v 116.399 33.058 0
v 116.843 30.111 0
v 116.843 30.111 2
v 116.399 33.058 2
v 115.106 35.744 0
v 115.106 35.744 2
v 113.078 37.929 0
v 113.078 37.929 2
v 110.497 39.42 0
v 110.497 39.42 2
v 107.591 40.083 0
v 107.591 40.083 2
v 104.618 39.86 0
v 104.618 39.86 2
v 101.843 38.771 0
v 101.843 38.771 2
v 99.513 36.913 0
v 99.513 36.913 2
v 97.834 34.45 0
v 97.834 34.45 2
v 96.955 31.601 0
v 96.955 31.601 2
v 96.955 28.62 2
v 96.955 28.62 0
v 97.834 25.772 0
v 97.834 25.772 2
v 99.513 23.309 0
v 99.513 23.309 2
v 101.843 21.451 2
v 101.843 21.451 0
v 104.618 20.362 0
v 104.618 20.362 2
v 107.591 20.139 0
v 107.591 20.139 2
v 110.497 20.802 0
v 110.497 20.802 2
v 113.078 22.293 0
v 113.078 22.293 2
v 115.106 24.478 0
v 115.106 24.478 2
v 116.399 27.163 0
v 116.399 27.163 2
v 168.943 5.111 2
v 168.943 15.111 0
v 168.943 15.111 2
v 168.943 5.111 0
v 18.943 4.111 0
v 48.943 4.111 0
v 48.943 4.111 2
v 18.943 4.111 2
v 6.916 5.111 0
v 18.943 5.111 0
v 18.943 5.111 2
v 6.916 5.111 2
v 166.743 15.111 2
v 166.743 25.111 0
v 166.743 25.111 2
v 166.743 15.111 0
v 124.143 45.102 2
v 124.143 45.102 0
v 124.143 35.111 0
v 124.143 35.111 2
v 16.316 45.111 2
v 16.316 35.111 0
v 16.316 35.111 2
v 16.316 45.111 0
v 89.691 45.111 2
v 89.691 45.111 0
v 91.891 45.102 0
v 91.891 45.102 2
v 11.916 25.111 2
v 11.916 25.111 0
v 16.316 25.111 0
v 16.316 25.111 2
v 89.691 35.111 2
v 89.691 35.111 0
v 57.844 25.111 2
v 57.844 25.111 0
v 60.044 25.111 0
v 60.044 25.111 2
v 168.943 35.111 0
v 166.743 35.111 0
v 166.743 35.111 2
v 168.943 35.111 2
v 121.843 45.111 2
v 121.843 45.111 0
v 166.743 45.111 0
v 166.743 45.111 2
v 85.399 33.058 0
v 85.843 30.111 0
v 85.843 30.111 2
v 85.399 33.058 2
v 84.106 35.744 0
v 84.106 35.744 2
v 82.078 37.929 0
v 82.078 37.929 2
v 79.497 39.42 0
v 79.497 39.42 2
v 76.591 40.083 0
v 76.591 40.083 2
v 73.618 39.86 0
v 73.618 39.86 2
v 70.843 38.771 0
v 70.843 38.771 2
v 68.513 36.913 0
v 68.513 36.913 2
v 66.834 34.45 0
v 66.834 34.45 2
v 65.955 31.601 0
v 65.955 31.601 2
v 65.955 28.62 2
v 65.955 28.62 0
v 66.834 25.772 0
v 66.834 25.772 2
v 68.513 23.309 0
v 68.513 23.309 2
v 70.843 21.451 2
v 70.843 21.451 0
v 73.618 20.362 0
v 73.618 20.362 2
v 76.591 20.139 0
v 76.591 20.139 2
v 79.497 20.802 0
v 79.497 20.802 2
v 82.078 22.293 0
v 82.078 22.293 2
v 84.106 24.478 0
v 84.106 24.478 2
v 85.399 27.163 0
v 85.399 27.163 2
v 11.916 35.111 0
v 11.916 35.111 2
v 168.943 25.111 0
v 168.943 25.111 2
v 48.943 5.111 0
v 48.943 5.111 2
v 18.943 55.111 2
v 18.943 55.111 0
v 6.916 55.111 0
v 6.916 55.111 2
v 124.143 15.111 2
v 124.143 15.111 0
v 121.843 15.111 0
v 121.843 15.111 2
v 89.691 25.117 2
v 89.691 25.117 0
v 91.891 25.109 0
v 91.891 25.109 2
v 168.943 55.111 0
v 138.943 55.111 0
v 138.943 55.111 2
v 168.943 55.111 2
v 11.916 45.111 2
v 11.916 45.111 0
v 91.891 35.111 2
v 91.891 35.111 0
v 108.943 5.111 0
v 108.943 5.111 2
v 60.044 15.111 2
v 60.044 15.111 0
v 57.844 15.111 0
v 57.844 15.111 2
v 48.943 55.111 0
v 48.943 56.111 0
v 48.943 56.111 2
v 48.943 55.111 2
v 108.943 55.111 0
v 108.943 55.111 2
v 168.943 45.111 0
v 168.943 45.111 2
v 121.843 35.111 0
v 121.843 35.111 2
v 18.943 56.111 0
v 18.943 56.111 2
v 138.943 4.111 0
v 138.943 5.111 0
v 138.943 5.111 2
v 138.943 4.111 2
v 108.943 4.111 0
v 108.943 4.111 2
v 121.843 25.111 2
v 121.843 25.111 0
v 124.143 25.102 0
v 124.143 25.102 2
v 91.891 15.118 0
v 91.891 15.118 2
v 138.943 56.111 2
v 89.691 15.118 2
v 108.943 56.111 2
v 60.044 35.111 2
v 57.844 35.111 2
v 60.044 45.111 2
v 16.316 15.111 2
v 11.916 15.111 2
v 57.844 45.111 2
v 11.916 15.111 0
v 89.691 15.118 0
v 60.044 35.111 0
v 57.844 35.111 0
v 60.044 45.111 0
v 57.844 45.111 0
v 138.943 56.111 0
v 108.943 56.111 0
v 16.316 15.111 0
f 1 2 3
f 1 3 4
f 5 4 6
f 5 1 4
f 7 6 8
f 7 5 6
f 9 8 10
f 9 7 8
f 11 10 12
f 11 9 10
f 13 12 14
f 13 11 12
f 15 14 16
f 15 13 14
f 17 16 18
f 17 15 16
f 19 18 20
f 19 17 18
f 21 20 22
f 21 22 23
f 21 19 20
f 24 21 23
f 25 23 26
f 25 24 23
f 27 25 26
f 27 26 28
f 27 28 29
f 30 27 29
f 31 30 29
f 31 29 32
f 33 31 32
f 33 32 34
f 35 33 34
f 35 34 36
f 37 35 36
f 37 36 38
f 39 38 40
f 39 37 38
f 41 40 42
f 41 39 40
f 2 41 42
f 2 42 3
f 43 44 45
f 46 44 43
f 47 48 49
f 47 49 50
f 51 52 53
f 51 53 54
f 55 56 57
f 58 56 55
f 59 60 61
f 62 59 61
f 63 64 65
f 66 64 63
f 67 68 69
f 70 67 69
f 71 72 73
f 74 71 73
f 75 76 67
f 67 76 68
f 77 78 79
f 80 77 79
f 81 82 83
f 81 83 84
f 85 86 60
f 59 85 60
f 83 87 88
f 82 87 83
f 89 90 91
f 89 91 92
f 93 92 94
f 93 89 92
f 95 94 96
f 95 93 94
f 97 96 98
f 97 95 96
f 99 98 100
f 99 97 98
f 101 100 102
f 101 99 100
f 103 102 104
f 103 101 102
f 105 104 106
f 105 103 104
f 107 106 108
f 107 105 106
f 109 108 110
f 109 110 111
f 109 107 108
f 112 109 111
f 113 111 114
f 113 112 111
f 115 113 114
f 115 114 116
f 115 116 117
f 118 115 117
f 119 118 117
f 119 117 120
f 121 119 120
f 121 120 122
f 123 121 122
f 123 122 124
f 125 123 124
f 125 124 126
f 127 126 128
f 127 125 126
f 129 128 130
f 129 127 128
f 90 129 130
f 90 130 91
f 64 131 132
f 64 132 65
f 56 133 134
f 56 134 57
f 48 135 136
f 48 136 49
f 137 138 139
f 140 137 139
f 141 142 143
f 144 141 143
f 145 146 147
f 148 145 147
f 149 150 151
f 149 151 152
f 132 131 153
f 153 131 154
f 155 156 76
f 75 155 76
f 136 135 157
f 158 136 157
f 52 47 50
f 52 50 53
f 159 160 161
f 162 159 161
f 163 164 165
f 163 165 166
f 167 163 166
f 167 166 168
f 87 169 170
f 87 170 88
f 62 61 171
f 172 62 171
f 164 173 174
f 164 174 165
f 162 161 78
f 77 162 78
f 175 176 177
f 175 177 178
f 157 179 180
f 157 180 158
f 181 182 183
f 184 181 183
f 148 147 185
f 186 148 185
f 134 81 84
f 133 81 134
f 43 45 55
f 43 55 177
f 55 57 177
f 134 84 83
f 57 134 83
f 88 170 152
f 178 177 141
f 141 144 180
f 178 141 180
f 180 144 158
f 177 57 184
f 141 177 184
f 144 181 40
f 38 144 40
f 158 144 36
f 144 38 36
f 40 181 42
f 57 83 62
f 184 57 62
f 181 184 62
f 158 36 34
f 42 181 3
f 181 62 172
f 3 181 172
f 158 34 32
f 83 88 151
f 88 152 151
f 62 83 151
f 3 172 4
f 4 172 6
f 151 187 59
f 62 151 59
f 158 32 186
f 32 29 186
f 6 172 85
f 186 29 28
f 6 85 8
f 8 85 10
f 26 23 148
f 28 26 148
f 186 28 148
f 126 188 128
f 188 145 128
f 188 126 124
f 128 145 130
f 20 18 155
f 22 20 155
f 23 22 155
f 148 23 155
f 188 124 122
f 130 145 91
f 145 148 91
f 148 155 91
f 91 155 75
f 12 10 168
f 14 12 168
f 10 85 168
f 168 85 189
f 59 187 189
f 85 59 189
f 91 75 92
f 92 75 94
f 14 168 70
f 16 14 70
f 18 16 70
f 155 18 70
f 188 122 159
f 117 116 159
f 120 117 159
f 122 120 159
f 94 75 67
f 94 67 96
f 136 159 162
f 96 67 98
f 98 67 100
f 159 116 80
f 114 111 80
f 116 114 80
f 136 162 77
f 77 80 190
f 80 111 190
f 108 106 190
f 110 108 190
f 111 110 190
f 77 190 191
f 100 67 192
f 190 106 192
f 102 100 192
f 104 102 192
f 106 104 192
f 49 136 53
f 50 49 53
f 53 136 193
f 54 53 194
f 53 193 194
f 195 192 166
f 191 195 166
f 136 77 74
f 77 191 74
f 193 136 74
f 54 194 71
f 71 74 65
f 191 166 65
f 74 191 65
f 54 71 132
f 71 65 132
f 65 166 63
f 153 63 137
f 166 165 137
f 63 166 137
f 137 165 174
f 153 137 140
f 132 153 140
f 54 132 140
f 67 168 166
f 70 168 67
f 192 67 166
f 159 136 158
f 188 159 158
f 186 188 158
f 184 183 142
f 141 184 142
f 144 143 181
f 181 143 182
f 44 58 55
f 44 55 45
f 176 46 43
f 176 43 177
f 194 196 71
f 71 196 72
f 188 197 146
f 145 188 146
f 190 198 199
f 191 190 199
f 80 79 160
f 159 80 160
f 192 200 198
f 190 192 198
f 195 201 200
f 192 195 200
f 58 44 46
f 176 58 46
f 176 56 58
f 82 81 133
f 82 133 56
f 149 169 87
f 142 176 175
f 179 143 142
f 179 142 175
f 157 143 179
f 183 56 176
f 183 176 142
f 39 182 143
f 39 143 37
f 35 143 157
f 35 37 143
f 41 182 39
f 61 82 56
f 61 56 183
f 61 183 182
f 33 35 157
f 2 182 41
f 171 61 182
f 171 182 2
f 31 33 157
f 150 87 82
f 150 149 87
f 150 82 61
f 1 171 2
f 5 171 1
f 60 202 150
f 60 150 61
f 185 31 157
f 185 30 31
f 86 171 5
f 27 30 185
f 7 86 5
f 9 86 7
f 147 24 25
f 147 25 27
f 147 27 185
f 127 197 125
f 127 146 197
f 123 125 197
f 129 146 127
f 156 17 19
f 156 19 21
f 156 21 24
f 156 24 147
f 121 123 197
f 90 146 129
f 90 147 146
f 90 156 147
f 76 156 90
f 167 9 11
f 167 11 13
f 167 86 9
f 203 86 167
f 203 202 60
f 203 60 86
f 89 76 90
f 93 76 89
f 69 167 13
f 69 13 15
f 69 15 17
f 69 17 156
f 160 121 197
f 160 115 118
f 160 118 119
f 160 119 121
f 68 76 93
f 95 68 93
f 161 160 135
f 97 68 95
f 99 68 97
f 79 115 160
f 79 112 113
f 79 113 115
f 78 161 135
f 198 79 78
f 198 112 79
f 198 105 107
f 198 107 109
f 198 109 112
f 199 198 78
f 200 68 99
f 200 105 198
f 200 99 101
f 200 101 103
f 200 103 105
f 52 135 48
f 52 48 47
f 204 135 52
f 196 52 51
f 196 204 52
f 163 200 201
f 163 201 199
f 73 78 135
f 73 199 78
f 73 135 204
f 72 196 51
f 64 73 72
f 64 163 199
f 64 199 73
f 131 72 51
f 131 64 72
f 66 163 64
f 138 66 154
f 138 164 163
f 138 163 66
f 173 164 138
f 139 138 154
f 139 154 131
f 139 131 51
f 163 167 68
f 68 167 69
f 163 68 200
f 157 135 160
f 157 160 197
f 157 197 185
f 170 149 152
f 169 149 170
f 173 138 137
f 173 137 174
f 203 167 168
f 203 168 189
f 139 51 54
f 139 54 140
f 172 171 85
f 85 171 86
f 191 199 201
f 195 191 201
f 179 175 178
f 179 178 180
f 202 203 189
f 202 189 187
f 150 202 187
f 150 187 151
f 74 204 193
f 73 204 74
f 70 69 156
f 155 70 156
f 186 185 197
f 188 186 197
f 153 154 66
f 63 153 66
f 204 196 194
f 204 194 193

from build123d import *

# Parameters (mm, degrees)
MODEL_R         = 10
MODEL_W         = 4.4
MODEL_H         = 10
EXTRUDE_1_DEPTH = 2


with BuildPart() as part:
    # Model → 凸台-拉伸1 (new body)
    with BuildSketch(Plane.XY):
        Polygon((13.943428414, 55.11082042), (18.943428414, 55.11082042), (18.943428414, 56.11082042), (48.943428414, 56.11082042), (48.943428414, 55.11082042), (108.943428414, 55.11082042), (108.943428414, 56.11082042), (138.943428414, 56.11082042), (138.943428414, 55.11082042), (168.943428414, 55.11082042), (168.943428414, 45.11082042), (166.743428414, 45.11082042), (166.743428414, 35.11082042), (168.943428414, 35.11082042), (168.943428414, 25.11082042), (166.743428414, 25.11082042), (166.743428414, 15.11082042), (168.943428414, 15.11082042), (168.943428414, 5.11082042), (138.943428414, 5.11082042), (138.943428414, 4.11082042), (108.943428414, 4.11082042), (108.943428414, 5.11082042), (61.943428414, 5.11082042), (55.943428414, 5.11082042), (48.943428414, 5.11082042), (48.943428414, 4.11082042), (18.943428414, 4.11082042), (18.943428414, 5.11082042), (6.91562917, 5.11082042), (6.91562917, 55.11082042), align=None)
        with Locations((75.843428414, 30.11082042)):
            Circle(MODEL_R, mode=Mode.SUBTRACT)
        with Locations((106.843428414, 30.11082042)):
            Circle(MODEL_R, mode=Mode.SUBTRACT)
        Polygon((89.690784519, 25.117395738), (91.890784519, 25.108786537), (91.89091955, 15.117786537), (89.690784519, 15.117786537), align=None, mode=Mode.SUBTRACT)
        Polygon((89.690784519, 45.110819609), (91.890784519, 45.102210408), (91.890784519, 35.110819609), (89.690784519, 35.110819609), align=None, mode=Mode.SUBTRACT)
        Polygon((121.843427205, 45.110819609), (124.143292174, 45.101819609), (124.143427205, 35.110819609), (121.843427205, 35.110819609), align=None, mode=Mode.SUBTRACT)
        Polygon((121.843427205, 25.110819609), (124.143292174, 25.101819609), (124.143427205, 15.110819609), (121.843427205, 15.110819609), align=None, mode=Mode.SUBTRACT)
        Polygon((57.844211187, 45.110819609), (60.044211187, 45.11081939), (60.044211187, 35.110819675), (57.844211187, 35.1108198), align=None, mode=Mode.SUBTRACT)
        Polygon((57.844211187, 25.110819609), (60.044211187, 25.11081939), (60.044211187, 15.110819675), (57.844211187, 15.1108198), align=None, mode=Mode.SUBTRACT)
        with Locations((14.11562917, 40.110820275)):
            Rectangle(MODEL_W, MODEL_H, mode=Mode.SUBTRACT)
        with Locations((14.11562917, 20.110820275)):
            Rectangle(MODEL_W, MODEL_H, mode=Mode.SUBTRACT)
    extrude(amount=EXTRUDE_1_DEPTH)


solid = part.part
